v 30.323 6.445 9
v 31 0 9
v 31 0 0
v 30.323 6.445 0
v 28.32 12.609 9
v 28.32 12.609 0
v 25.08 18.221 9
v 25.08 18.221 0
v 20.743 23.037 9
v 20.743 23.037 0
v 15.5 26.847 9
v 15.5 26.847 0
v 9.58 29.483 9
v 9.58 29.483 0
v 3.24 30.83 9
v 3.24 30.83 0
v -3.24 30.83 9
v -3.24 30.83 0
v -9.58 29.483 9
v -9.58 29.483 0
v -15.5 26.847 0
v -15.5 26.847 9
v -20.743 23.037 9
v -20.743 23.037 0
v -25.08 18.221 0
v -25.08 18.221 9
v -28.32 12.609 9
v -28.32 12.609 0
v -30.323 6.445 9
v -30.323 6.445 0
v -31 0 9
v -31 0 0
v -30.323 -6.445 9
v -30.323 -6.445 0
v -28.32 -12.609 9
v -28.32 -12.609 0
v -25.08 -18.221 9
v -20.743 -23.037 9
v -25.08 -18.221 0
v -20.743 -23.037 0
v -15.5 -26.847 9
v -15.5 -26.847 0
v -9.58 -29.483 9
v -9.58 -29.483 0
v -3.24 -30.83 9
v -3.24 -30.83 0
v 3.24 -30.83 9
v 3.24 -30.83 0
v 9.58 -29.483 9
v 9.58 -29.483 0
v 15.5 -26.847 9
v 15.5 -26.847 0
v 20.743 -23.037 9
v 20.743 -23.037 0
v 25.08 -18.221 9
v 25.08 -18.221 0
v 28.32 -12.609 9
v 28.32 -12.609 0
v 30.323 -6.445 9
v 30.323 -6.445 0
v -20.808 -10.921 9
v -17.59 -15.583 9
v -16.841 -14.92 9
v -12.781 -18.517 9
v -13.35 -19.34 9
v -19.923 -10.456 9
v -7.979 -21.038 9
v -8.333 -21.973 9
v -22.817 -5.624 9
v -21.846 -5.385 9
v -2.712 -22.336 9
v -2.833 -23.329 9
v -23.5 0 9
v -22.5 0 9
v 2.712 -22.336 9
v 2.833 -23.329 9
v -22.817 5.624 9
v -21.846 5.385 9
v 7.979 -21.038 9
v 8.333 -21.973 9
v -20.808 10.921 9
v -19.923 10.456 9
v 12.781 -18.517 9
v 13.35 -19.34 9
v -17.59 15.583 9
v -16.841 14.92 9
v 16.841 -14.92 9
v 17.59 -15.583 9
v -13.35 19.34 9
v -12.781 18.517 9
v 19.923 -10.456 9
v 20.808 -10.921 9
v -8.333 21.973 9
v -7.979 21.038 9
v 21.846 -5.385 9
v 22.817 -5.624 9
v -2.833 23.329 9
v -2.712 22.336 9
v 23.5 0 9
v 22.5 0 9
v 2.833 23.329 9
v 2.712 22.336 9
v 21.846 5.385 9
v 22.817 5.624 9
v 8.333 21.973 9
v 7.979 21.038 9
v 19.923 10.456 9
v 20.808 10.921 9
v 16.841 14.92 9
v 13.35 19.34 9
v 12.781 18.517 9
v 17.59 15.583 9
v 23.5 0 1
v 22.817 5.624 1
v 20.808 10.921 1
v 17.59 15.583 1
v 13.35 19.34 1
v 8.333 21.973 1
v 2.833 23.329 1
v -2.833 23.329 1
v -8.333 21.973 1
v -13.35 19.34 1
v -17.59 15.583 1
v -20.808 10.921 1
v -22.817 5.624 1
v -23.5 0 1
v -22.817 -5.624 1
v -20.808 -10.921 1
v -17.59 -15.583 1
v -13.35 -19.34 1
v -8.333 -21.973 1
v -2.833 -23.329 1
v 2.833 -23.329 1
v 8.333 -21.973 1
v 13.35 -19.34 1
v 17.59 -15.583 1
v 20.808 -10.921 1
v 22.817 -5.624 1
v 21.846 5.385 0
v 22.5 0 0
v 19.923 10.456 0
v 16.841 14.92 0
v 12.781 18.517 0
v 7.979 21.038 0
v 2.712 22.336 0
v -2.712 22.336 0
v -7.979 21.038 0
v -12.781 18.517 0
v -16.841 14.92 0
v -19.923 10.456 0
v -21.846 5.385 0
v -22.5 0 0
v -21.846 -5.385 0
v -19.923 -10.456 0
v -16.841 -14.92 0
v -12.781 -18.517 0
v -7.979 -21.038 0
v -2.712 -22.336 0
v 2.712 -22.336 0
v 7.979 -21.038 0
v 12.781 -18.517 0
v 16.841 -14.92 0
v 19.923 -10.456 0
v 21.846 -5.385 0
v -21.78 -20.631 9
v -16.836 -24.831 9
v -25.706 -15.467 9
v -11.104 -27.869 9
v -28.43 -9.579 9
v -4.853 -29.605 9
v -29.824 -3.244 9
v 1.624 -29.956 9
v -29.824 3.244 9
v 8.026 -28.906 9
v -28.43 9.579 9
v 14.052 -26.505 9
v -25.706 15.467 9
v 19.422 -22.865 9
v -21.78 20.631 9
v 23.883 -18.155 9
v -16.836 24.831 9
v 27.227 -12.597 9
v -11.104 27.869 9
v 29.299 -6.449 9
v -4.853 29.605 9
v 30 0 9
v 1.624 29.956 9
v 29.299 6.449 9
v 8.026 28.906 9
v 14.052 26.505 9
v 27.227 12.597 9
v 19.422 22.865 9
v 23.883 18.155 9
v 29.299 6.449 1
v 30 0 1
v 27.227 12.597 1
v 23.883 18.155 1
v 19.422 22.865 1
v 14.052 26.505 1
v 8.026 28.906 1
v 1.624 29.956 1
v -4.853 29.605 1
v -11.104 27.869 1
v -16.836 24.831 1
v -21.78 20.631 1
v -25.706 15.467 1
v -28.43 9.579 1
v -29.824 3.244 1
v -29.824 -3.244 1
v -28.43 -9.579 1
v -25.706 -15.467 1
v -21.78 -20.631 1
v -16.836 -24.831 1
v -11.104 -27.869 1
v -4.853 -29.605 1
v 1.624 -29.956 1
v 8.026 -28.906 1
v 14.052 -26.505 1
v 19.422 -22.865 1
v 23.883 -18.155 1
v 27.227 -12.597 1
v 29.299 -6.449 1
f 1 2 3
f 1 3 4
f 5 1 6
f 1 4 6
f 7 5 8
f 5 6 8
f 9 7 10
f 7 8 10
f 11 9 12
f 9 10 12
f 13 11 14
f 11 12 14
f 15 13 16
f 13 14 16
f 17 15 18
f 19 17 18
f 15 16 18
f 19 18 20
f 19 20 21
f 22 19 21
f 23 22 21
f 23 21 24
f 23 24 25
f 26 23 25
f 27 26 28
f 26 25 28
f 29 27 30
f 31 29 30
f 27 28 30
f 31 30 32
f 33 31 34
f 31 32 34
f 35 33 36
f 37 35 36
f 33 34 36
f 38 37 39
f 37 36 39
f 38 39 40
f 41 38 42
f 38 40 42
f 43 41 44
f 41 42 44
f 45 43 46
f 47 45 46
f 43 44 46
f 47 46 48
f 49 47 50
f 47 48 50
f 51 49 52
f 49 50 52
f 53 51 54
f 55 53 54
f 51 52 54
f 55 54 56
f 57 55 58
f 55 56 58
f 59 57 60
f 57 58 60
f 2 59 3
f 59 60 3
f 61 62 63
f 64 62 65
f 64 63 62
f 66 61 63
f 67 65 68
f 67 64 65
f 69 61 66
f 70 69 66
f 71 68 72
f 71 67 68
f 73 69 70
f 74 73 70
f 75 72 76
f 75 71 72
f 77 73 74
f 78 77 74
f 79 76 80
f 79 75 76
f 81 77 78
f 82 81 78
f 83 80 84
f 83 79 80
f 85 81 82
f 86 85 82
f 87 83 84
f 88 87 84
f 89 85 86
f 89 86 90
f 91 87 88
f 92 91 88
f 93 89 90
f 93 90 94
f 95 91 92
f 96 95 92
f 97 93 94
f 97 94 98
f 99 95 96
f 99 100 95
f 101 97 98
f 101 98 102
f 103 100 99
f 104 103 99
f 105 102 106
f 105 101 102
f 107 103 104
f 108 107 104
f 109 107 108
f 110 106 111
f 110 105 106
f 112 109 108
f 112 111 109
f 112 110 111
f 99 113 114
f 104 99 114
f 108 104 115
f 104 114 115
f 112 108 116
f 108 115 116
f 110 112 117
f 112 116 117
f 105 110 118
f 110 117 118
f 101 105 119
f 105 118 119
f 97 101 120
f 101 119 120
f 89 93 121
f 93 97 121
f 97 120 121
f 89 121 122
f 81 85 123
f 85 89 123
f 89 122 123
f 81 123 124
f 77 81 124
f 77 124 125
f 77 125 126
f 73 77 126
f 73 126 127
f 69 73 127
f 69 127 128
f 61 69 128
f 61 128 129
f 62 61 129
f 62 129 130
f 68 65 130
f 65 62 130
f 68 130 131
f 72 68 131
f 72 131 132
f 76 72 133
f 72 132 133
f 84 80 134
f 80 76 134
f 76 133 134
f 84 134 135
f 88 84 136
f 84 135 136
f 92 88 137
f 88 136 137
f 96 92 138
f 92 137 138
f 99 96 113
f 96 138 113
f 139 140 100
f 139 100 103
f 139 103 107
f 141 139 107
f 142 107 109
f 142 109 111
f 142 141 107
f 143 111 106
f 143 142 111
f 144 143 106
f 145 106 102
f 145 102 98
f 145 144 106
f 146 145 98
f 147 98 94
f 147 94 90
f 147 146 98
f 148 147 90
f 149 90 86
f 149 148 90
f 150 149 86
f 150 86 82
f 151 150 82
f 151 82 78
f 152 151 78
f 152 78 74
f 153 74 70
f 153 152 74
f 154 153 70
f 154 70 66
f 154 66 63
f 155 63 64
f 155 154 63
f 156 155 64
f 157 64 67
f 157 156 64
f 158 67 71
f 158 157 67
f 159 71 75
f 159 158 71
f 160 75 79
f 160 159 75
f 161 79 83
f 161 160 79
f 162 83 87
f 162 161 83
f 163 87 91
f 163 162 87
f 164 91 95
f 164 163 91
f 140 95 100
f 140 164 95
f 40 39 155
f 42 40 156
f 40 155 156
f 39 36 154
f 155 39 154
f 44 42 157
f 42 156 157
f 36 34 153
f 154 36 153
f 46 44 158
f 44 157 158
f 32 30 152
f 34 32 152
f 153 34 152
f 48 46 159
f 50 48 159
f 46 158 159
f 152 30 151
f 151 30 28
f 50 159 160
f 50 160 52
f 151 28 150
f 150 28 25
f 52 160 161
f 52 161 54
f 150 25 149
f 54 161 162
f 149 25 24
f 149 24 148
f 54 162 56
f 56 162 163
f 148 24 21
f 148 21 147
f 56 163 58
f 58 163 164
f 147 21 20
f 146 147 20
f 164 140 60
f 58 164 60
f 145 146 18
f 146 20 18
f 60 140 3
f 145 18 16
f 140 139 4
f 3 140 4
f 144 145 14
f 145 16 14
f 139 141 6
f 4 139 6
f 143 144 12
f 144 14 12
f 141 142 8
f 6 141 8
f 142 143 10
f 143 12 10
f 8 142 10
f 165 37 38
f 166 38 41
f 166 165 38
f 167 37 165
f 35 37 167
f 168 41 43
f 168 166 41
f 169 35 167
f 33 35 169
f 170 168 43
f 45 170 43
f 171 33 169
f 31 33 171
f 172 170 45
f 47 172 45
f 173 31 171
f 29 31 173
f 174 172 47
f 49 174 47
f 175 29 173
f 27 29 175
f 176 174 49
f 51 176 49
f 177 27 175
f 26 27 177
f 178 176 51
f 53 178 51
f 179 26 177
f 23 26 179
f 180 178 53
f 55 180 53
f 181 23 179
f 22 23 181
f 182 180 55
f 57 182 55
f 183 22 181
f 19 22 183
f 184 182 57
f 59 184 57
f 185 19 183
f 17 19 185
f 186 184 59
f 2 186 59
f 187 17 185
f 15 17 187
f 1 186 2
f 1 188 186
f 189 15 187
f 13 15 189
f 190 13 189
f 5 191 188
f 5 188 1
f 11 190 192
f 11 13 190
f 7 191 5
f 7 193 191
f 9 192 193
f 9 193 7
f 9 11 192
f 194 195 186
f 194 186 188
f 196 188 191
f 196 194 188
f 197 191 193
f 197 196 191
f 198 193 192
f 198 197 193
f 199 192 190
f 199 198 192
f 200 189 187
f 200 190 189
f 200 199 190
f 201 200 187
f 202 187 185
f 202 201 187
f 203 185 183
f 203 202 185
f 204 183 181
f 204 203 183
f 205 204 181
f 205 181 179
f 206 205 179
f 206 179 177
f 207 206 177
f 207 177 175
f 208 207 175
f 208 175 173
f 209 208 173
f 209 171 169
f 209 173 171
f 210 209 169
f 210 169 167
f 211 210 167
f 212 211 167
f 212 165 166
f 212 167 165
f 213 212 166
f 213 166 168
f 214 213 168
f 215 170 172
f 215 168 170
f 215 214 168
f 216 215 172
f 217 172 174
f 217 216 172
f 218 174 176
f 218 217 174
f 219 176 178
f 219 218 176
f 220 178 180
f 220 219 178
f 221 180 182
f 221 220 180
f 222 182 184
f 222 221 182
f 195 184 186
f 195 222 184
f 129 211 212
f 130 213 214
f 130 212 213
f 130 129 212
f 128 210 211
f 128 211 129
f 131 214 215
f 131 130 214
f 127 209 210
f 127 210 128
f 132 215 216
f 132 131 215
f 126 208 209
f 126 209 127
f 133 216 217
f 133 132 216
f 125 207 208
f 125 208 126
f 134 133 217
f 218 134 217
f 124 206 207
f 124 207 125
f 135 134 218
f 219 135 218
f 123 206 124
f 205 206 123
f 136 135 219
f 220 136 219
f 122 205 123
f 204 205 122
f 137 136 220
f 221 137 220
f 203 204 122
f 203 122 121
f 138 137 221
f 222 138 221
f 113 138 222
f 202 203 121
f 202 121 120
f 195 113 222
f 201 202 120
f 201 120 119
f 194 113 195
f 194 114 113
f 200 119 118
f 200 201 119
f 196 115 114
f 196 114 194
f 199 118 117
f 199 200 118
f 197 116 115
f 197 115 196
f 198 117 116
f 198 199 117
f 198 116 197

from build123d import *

# Parameters (mm, degrees)
SKETCH_1_R      = 31
SKETCH_1_R_2    = 22.5
EXTRUDE_1_DEPTH = 9
SHELL_1_T       = -1


with BuildPart() as part:
    # 草图1 → 凸台-拉伸1 (new body)
    with BuildSketch(Plane.XY):
        Circle(SKETCH_1_R)
        Circle(SKETCH_1_R_2, mode=Mode.SUBTRACT)
    extrude(amount=EXTRUDE_1_DEPTH)

    # 抽壳1
    shell_1_openings = [part.faces().sort_by_distance(p)[0] for p in [
        (-30.123187591, 0, 9),
    ]]
    offset(amount=SHELL_1_T, openings=shell_1_openings, kind=Kind.INTERSECTION)


solid = part.part
